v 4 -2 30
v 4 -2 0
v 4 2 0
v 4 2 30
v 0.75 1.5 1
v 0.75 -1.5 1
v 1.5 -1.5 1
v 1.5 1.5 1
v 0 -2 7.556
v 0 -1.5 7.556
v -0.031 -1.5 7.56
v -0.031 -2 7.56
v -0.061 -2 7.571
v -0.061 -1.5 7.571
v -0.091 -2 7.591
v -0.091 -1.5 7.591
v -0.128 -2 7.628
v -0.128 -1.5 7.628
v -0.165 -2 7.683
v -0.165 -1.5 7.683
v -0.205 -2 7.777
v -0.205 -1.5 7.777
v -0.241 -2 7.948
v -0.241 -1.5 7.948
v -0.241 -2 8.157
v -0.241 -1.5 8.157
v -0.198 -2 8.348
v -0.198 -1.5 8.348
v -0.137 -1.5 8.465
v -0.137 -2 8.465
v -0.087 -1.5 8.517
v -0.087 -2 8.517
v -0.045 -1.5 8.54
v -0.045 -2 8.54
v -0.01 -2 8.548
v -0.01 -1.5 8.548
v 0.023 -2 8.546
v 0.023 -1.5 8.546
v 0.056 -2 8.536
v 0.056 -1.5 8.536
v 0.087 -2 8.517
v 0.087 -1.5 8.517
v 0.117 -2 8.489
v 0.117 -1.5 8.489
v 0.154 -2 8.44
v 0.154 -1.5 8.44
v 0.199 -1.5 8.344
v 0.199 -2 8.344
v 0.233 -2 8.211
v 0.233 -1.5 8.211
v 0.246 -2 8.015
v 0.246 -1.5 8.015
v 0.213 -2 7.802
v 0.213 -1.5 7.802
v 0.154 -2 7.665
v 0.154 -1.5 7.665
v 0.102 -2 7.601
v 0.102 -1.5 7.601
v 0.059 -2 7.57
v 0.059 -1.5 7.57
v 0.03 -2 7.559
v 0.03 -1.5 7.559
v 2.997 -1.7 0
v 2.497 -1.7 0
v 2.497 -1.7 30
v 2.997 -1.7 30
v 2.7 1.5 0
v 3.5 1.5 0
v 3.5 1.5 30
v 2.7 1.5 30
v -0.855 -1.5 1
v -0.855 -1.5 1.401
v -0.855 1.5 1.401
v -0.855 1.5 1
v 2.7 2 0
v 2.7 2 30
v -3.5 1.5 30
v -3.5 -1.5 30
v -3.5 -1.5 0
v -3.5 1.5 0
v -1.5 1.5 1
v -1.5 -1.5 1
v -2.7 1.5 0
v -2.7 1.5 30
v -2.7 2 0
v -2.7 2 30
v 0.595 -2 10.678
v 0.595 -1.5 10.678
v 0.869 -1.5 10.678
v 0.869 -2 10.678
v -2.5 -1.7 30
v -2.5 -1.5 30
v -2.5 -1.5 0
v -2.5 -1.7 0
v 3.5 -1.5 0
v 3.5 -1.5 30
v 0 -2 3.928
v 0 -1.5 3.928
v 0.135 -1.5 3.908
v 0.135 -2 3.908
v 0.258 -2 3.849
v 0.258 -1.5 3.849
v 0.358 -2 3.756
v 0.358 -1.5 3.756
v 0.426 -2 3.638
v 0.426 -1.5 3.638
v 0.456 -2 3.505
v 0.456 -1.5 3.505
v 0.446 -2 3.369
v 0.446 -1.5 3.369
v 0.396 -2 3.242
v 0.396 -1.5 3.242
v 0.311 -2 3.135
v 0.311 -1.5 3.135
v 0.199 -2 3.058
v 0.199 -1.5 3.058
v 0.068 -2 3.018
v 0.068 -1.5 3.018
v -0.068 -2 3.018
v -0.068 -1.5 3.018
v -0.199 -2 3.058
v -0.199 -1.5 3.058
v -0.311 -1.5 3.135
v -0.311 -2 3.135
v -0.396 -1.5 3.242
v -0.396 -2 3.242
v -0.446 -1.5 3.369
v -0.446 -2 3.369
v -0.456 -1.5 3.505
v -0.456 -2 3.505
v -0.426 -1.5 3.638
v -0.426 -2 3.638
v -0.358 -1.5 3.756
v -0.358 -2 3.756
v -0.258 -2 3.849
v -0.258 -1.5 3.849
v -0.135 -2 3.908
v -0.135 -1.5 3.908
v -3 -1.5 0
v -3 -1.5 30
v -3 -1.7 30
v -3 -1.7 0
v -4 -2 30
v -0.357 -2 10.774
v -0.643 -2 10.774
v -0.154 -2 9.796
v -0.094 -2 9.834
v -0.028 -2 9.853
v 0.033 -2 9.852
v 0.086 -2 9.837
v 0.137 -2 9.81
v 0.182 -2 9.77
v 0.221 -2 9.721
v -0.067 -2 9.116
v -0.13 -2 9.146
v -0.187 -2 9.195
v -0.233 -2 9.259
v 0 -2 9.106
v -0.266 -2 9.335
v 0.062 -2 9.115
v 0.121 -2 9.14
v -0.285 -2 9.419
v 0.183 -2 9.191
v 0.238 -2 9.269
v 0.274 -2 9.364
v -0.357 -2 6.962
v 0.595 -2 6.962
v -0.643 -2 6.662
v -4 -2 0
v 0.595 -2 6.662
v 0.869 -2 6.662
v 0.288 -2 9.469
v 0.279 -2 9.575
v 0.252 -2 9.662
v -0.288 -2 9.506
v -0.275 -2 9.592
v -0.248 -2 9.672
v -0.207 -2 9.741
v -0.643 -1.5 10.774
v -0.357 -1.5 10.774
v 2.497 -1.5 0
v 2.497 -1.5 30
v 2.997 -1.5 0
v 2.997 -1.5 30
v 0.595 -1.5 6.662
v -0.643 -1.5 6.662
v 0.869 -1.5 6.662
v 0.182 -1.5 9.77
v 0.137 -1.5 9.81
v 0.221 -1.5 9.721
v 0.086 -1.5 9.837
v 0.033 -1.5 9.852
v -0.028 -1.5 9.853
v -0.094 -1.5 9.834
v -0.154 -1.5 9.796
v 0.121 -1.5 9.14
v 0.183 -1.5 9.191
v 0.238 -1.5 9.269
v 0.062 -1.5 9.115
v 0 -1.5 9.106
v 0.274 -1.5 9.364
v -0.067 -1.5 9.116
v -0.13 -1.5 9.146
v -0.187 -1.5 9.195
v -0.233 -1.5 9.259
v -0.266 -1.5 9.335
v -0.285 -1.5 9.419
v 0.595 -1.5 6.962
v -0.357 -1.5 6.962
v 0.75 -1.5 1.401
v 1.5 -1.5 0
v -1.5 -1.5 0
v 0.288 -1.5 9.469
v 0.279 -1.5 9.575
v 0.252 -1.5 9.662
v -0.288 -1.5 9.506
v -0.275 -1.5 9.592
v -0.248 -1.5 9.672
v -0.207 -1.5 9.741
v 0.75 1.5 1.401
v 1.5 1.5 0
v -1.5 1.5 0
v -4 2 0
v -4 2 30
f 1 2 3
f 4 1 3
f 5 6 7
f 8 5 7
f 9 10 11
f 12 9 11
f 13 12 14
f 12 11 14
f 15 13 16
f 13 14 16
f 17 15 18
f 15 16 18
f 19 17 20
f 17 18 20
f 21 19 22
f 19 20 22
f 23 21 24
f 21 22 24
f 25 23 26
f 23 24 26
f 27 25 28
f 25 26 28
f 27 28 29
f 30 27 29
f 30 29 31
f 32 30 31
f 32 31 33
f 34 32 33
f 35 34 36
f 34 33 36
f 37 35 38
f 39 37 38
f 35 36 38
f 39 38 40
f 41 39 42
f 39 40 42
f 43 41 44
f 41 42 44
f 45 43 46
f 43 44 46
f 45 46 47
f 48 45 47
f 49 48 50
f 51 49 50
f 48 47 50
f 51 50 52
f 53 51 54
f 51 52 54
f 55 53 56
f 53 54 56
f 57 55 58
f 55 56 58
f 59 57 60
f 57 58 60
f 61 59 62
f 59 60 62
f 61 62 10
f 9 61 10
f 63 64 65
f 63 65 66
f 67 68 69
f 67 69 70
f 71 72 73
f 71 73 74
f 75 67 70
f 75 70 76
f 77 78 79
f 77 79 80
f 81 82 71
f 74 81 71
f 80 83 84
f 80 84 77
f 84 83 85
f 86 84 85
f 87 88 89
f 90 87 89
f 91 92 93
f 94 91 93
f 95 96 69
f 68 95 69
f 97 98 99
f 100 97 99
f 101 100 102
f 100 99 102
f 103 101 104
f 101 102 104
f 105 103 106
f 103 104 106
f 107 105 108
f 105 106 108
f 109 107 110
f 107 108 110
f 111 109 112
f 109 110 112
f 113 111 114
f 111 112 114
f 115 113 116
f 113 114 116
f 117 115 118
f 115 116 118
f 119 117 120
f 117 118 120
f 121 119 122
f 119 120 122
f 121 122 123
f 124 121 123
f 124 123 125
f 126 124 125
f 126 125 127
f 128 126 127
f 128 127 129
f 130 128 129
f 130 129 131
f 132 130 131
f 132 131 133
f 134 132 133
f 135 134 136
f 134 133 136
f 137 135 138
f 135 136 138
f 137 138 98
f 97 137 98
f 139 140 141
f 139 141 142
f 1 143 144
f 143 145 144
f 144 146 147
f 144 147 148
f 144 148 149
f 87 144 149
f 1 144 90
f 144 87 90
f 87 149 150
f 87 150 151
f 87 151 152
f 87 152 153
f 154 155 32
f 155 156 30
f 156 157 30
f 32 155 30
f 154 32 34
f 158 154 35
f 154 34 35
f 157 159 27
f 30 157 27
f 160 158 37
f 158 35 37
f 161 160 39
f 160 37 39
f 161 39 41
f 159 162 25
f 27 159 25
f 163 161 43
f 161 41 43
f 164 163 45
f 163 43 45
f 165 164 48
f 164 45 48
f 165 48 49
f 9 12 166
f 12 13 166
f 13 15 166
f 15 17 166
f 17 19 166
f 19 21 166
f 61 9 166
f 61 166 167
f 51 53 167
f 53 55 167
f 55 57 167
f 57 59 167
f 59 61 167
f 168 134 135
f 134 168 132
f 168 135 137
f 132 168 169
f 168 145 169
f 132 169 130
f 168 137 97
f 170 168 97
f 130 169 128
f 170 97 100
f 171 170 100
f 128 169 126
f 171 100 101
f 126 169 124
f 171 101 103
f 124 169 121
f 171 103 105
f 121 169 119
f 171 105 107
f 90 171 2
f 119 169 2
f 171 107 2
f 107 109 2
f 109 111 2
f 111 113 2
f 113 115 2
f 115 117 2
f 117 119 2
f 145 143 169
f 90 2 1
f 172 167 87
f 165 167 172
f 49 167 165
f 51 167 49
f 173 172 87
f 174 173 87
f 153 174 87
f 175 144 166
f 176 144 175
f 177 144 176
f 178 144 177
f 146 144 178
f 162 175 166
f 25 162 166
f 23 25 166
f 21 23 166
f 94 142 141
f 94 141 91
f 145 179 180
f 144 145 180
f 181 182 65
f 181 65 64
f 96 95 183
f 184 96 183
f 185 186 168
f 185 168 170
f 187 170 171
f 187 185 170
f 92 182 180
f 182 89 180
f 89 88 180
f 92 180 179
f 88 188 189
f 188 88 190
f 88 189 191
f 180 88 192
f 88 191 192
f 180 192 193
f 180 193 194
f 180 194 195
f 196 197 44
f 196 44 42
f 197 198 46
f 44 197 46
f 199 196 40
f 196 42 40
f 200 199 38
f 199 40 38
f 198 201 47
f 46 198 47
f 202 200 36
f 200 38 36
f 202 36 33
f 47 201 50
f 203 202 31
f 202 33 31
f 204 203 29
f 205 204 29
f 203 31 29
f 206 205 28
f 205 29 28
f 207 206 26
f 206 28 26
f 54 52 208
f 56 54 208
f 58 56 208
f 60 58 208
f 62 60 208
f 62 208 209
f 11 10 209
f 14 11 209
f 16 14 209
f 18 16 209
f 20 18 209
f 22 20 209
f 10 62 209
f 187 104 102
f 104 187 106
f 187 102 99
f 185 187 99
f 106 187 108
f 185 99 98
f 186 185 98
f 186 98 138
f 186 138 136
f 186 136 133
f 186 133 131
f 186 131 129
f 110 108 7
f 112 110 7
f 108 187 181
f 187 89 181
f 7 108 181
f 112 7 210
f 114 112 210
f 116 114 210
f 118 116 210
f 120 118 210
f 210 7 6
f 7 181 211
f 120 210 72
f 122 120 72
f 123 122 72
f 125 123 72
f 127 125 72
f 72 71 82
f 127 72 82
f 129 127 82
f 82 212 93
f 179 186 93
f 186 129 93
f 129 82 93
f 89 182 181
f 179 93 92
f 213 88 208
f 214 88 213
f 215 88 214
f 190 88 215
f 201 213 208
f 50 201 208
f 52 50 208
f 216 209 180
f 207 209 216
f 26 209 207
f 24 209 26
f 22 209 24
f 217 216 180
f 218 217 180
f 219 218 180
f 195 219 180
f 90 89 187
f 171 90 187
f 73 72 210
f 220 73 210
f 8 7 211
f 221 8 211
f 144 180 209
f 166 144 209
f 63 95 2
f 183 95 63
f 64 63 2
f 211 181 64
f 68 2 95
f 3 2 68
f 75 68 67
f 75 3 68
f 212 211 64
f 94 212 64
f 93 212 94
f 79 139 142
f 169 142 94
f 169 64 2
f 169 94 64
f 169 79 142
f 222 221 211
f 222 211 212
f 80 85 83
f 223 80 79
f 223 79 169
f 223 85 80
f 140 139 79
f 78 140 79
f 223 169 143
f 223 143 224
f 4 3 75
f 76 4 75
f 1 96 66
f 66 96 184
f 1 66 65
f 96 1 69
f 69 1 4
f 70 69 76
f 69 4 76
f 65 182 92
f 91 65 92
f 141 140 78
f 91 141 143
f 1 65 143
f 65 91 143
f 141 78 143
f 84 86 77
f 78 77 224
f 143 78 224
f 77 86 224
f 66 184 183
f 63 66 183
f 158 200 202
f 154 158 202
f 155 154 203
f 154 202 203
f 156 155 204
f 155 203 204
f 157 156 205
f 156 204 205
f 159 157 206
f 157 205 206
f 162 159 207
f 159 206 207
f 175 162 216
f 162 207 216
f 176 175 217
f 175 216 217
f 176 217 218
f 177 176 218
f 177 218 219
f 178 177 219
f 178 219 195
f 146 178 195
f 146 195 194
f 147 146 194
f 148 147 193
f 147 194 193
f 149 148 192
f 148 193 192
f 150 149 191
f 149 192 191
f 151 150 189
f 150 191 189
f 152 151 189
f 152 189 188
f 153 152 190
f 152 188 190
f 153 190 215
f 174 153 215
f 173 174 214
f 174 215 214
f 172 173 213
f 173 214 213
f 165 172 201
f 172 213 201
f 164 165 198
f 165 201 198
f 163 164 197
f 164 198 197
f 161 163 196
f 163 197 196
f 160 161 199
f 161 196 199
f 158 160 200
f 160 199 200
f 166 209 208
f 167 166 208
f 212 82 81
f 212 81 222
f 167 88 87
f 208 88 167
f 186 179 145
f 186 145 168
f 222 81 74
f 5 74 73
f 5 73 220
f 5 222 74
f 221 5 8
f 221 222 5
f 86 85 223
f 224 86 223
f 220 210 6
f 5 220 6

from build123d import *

# Parameters (mm, degrees)
SKETCH_9_W           = 8
SKETCH_9_H           = 4
EXTRUDE_3_DEPTH      = 30
SKETCH_12_W          = 7
SKETCH_12_H          = 3.5
CUT_EXTRUDE_6_DEPTH  = 30
SKETCH_19_W          = 3
SKETCH_19_H          = 1
EXTRUDE_5_DEPTH      = 3
SKETCH_20_W          = 1.605632867
SKETCH_20_H          = 0.400892845
EXTRUDE_6_DEPTH      = 3
SKETCH_22_W          = 0.5
SKETCH_22_H          = 30
CUT_EXTRUDE_7_DEPTH  = 0.2
SKETCH_24_W          = 0.5
SKETCH_24_H          = 30
CUT_EXTRUDE_8_DEPTH  = 0.2
SKETCH_25_R          = 0.457551157
CUT_EXTRUDE_9_DEPTH  = 0.5
SKETCH_26_RX         = 0.496424447
SKETCH_26_RY         = 0.246353064
CUT_EXTRUDE_10_DEPTH = 0.5
SKETCH_27_RX         = 0.374325804
SKETCH_27_RY         = 0.288568922
CUT_EXTRUDE_11_DEPTH = 0.5
SKETCH_28_W          = 0.274311356
SKETCH_28_H          = 4.016178833
CUT_EXTRUDE_12_DEPTH = 0.5
SKETCH_29_W          = 1.237753382
SKETCH_29_H          = 0.3
CUT_EXTRUDE_13_DEPTH = 0.5
SKETCH_31_W          = 0.285973064
SKETCH_31_H          = 3.811928928
CUT_EXTRUDE_14_DEPTH = 0.5
SKETCH_32_W          = 0.8
SKETCH_32_H          = 0.5
EXTRUDE_7_DEPTH      = 30
SKETCH_33_W          = 0.8
SKETCH_33_H          = 0.5
EXTRUDE_8_DEPTH      = 30


with BuildPart() as part:
    # 草圖9 → 填料-伸長3 (new body)
    with BuildSketch(Plane.XY):
        Rectangle(SKETCH_9_W, SKETCH_9_H)
    extrude(amount=EXTRUDE_3_DEPTH)

    # 草圖12 → 除料-伸長6 (cut)
    with BuildSketch(Plane(origin=(0, 0, 0), x_dir=(-1, 0, 0), z_dir=(0, 0, -1))):
        with Locations((0, 0.25)):
            Rectangle(SKETCH_12_W, SKETCH_12_H)
    extrude(amount=-CUT_EXTRUDE_6_DEPTH, mode=Mode.SUBTRACT)

    # 草圖19 → 填料-伸長5 (add)
    with BuildSketch(Plane(origin=(0, -1.5, 0), x_dir=(1, 0, 0), z_dir=(0, 1, 0))):
        with Locations((0, -0.5)):
            Rectangle(SKETCH_19_W, SKETCH_19_H)
    extrude(amount=EXTRUDE_5_DEPTH)

    # 草圖20 → 填料-伸長6 (add)
    with BuildSketch(Plane(origin=(0, -1.5, 0), x_dir=(1, 0, 0), z_dir=(0, 1, 0))):
        with Locations((-0.052553258, -1.200446422)):
            Rectangle(SKETCH_20_W, SKETCH_20_H)
    extrude(amount=EXTRUDE_6_DEPTH)

    # 草圖22 → 除料-伸長7 (cut)
    with BuildSketch(Plane(origin=(0, -1.5, 0), x_dir=(1, 0, 0), z_dir=(0, 1, 0))):
        with Locations((-2.75, -15)):
            Rectangle(SKETCH_22_W, SKETCH_22_H)
    extrude(amount=-CUT_EXTRUDE_7_DEPTH, mode=Mode.SUBTRACT)

    # 草圖24 → 除料-伸長8 (cut)
    with BuildSketch(Plane(origin=(0, -1.5, 0), x_dir=(1, 0, 0), z_dir=(0, 1, 0))):
        with Locations((2.747295887, -15)):
            Rectangle(SKETCH_24_W, SKETCH_24_H)
    extrude(amount=-CUT_EXTRUDE_8_DEPTH, mode=Mode.SUBTRACT)

    # 草圖25 → 除料-伸長9 (cut)
    with BuildSketch(Plane(origin=(0, -1.5, 0), x_dir=(1, 0, 0), z_dir=(0, 1, 0))):
        with Locations(Location((0, -3.470601741, 0), (0, 0, 270))):
            Circle(SKETCH_25_R)
    extrude(amount=-CUT_EXTRUDE_9_DEPTH, mode=Mode.SUBTRACT)

    # 草圖26 → 除料-伸長10 (cut)
    with BuildSketch(Plane(origin=(0, -1.5, 0), x_dir=(1, 0, 0), z_dir=(0, 1, 0))):
        with Locations(Location((0, -8.0522519), (0, 0, 90))):
            Ellipse(SKETCH_26_RX, SKETCH_26_RY)
    extrude(amount=-CUT_EXTRUDE_10_DEPTH, mode=Mode.SUBTRACT)

    # 草圖27 → 除料-伸長11 (cut)
    with BuildSketch(Plane(origin=(0, -1.5, 0), x_dir=(1, 0, 0), z_dir=(0, 1, 0))):
        with Locations(Location((0, -9.480269605), (0, 0, 90))):
            Ellipse(SKETCH_27_RX, SKETCH_27_RY)
    extrude(amount=-CUT_EXTRUDE_11_DEPTH, mode=Mode.SUBTRACT)

    # 草圖28 → 除料-伸長12 (cut)
    with BuildSketch(Plane(origin=(0, -1.5, 0), x_dir=(1, 0, 0), z_dir=(0, 1, 0))):
        with Locations((0.731907804, -8.669902249)):
            Rectangle(SKETCH_28_W, SKETCH_28_H)
    extrude(amount=-CUT_EXTRUDE_12_DEPTH, mode=Mode.SUBTRACT)

    # 草圖29 → 除料-伸長13 (cut)
    with BuildSketch(Plane(origin=(0, -1.5, 0), x_dir=(1, 0, 0), z_dir=(0, 1, 0))):
        with Locations((-0.024124565, -6.811812832)):
            Rectangle(SKETCH_29_W, SKETCH_29_H)
    extrude(amount=-CUT_EXTRUDE_13_DEPTH, mode=Mode.SUBTRACT)

    # 草圖31 → 除料-伸長14 (cut)
    with BuildSketch(Plane(origin=(0, -1.5, 0), x_dir=(1, 0, 0), z_dir=(0, 1, 0))):
        with Locations((-0.500014724, -8.867777296)):
            Rectangle(SKETCH_31_W, SKETCH_31_H)
    extrude(amount=-CUT_EXTRUDE_14_DEPTH, mode=Mode.SUBTRACT)

    # 草圖32 → 填料-伸長7 (add)
    with BuildSketch(Plane(origin=(0, 0, 0), x_dir=(-1, 0, 0), z_dir=(0, 0, -1))):
        with Locations((-3.1, 1.75)):
            Rectangle(SKETCH_32_W, SKETCH_32_H)
    extrude(amount=-EXTRUDE_7_DEPTH)

    # 草圖33 → 填料-伸長8 (add)
    with BuildSketch(Plane(origin=(0, 0, 0), x_dir=(-1, 0, 0), z_dir=(0, 0, -1))):
        with Locations((3.1, 1.75)):
            Rectangle(SKETCH_33_W, SKETCH_33_H)
    extrude(amount=-EXTRUDE_8_DEPTH)


solid = part.part
